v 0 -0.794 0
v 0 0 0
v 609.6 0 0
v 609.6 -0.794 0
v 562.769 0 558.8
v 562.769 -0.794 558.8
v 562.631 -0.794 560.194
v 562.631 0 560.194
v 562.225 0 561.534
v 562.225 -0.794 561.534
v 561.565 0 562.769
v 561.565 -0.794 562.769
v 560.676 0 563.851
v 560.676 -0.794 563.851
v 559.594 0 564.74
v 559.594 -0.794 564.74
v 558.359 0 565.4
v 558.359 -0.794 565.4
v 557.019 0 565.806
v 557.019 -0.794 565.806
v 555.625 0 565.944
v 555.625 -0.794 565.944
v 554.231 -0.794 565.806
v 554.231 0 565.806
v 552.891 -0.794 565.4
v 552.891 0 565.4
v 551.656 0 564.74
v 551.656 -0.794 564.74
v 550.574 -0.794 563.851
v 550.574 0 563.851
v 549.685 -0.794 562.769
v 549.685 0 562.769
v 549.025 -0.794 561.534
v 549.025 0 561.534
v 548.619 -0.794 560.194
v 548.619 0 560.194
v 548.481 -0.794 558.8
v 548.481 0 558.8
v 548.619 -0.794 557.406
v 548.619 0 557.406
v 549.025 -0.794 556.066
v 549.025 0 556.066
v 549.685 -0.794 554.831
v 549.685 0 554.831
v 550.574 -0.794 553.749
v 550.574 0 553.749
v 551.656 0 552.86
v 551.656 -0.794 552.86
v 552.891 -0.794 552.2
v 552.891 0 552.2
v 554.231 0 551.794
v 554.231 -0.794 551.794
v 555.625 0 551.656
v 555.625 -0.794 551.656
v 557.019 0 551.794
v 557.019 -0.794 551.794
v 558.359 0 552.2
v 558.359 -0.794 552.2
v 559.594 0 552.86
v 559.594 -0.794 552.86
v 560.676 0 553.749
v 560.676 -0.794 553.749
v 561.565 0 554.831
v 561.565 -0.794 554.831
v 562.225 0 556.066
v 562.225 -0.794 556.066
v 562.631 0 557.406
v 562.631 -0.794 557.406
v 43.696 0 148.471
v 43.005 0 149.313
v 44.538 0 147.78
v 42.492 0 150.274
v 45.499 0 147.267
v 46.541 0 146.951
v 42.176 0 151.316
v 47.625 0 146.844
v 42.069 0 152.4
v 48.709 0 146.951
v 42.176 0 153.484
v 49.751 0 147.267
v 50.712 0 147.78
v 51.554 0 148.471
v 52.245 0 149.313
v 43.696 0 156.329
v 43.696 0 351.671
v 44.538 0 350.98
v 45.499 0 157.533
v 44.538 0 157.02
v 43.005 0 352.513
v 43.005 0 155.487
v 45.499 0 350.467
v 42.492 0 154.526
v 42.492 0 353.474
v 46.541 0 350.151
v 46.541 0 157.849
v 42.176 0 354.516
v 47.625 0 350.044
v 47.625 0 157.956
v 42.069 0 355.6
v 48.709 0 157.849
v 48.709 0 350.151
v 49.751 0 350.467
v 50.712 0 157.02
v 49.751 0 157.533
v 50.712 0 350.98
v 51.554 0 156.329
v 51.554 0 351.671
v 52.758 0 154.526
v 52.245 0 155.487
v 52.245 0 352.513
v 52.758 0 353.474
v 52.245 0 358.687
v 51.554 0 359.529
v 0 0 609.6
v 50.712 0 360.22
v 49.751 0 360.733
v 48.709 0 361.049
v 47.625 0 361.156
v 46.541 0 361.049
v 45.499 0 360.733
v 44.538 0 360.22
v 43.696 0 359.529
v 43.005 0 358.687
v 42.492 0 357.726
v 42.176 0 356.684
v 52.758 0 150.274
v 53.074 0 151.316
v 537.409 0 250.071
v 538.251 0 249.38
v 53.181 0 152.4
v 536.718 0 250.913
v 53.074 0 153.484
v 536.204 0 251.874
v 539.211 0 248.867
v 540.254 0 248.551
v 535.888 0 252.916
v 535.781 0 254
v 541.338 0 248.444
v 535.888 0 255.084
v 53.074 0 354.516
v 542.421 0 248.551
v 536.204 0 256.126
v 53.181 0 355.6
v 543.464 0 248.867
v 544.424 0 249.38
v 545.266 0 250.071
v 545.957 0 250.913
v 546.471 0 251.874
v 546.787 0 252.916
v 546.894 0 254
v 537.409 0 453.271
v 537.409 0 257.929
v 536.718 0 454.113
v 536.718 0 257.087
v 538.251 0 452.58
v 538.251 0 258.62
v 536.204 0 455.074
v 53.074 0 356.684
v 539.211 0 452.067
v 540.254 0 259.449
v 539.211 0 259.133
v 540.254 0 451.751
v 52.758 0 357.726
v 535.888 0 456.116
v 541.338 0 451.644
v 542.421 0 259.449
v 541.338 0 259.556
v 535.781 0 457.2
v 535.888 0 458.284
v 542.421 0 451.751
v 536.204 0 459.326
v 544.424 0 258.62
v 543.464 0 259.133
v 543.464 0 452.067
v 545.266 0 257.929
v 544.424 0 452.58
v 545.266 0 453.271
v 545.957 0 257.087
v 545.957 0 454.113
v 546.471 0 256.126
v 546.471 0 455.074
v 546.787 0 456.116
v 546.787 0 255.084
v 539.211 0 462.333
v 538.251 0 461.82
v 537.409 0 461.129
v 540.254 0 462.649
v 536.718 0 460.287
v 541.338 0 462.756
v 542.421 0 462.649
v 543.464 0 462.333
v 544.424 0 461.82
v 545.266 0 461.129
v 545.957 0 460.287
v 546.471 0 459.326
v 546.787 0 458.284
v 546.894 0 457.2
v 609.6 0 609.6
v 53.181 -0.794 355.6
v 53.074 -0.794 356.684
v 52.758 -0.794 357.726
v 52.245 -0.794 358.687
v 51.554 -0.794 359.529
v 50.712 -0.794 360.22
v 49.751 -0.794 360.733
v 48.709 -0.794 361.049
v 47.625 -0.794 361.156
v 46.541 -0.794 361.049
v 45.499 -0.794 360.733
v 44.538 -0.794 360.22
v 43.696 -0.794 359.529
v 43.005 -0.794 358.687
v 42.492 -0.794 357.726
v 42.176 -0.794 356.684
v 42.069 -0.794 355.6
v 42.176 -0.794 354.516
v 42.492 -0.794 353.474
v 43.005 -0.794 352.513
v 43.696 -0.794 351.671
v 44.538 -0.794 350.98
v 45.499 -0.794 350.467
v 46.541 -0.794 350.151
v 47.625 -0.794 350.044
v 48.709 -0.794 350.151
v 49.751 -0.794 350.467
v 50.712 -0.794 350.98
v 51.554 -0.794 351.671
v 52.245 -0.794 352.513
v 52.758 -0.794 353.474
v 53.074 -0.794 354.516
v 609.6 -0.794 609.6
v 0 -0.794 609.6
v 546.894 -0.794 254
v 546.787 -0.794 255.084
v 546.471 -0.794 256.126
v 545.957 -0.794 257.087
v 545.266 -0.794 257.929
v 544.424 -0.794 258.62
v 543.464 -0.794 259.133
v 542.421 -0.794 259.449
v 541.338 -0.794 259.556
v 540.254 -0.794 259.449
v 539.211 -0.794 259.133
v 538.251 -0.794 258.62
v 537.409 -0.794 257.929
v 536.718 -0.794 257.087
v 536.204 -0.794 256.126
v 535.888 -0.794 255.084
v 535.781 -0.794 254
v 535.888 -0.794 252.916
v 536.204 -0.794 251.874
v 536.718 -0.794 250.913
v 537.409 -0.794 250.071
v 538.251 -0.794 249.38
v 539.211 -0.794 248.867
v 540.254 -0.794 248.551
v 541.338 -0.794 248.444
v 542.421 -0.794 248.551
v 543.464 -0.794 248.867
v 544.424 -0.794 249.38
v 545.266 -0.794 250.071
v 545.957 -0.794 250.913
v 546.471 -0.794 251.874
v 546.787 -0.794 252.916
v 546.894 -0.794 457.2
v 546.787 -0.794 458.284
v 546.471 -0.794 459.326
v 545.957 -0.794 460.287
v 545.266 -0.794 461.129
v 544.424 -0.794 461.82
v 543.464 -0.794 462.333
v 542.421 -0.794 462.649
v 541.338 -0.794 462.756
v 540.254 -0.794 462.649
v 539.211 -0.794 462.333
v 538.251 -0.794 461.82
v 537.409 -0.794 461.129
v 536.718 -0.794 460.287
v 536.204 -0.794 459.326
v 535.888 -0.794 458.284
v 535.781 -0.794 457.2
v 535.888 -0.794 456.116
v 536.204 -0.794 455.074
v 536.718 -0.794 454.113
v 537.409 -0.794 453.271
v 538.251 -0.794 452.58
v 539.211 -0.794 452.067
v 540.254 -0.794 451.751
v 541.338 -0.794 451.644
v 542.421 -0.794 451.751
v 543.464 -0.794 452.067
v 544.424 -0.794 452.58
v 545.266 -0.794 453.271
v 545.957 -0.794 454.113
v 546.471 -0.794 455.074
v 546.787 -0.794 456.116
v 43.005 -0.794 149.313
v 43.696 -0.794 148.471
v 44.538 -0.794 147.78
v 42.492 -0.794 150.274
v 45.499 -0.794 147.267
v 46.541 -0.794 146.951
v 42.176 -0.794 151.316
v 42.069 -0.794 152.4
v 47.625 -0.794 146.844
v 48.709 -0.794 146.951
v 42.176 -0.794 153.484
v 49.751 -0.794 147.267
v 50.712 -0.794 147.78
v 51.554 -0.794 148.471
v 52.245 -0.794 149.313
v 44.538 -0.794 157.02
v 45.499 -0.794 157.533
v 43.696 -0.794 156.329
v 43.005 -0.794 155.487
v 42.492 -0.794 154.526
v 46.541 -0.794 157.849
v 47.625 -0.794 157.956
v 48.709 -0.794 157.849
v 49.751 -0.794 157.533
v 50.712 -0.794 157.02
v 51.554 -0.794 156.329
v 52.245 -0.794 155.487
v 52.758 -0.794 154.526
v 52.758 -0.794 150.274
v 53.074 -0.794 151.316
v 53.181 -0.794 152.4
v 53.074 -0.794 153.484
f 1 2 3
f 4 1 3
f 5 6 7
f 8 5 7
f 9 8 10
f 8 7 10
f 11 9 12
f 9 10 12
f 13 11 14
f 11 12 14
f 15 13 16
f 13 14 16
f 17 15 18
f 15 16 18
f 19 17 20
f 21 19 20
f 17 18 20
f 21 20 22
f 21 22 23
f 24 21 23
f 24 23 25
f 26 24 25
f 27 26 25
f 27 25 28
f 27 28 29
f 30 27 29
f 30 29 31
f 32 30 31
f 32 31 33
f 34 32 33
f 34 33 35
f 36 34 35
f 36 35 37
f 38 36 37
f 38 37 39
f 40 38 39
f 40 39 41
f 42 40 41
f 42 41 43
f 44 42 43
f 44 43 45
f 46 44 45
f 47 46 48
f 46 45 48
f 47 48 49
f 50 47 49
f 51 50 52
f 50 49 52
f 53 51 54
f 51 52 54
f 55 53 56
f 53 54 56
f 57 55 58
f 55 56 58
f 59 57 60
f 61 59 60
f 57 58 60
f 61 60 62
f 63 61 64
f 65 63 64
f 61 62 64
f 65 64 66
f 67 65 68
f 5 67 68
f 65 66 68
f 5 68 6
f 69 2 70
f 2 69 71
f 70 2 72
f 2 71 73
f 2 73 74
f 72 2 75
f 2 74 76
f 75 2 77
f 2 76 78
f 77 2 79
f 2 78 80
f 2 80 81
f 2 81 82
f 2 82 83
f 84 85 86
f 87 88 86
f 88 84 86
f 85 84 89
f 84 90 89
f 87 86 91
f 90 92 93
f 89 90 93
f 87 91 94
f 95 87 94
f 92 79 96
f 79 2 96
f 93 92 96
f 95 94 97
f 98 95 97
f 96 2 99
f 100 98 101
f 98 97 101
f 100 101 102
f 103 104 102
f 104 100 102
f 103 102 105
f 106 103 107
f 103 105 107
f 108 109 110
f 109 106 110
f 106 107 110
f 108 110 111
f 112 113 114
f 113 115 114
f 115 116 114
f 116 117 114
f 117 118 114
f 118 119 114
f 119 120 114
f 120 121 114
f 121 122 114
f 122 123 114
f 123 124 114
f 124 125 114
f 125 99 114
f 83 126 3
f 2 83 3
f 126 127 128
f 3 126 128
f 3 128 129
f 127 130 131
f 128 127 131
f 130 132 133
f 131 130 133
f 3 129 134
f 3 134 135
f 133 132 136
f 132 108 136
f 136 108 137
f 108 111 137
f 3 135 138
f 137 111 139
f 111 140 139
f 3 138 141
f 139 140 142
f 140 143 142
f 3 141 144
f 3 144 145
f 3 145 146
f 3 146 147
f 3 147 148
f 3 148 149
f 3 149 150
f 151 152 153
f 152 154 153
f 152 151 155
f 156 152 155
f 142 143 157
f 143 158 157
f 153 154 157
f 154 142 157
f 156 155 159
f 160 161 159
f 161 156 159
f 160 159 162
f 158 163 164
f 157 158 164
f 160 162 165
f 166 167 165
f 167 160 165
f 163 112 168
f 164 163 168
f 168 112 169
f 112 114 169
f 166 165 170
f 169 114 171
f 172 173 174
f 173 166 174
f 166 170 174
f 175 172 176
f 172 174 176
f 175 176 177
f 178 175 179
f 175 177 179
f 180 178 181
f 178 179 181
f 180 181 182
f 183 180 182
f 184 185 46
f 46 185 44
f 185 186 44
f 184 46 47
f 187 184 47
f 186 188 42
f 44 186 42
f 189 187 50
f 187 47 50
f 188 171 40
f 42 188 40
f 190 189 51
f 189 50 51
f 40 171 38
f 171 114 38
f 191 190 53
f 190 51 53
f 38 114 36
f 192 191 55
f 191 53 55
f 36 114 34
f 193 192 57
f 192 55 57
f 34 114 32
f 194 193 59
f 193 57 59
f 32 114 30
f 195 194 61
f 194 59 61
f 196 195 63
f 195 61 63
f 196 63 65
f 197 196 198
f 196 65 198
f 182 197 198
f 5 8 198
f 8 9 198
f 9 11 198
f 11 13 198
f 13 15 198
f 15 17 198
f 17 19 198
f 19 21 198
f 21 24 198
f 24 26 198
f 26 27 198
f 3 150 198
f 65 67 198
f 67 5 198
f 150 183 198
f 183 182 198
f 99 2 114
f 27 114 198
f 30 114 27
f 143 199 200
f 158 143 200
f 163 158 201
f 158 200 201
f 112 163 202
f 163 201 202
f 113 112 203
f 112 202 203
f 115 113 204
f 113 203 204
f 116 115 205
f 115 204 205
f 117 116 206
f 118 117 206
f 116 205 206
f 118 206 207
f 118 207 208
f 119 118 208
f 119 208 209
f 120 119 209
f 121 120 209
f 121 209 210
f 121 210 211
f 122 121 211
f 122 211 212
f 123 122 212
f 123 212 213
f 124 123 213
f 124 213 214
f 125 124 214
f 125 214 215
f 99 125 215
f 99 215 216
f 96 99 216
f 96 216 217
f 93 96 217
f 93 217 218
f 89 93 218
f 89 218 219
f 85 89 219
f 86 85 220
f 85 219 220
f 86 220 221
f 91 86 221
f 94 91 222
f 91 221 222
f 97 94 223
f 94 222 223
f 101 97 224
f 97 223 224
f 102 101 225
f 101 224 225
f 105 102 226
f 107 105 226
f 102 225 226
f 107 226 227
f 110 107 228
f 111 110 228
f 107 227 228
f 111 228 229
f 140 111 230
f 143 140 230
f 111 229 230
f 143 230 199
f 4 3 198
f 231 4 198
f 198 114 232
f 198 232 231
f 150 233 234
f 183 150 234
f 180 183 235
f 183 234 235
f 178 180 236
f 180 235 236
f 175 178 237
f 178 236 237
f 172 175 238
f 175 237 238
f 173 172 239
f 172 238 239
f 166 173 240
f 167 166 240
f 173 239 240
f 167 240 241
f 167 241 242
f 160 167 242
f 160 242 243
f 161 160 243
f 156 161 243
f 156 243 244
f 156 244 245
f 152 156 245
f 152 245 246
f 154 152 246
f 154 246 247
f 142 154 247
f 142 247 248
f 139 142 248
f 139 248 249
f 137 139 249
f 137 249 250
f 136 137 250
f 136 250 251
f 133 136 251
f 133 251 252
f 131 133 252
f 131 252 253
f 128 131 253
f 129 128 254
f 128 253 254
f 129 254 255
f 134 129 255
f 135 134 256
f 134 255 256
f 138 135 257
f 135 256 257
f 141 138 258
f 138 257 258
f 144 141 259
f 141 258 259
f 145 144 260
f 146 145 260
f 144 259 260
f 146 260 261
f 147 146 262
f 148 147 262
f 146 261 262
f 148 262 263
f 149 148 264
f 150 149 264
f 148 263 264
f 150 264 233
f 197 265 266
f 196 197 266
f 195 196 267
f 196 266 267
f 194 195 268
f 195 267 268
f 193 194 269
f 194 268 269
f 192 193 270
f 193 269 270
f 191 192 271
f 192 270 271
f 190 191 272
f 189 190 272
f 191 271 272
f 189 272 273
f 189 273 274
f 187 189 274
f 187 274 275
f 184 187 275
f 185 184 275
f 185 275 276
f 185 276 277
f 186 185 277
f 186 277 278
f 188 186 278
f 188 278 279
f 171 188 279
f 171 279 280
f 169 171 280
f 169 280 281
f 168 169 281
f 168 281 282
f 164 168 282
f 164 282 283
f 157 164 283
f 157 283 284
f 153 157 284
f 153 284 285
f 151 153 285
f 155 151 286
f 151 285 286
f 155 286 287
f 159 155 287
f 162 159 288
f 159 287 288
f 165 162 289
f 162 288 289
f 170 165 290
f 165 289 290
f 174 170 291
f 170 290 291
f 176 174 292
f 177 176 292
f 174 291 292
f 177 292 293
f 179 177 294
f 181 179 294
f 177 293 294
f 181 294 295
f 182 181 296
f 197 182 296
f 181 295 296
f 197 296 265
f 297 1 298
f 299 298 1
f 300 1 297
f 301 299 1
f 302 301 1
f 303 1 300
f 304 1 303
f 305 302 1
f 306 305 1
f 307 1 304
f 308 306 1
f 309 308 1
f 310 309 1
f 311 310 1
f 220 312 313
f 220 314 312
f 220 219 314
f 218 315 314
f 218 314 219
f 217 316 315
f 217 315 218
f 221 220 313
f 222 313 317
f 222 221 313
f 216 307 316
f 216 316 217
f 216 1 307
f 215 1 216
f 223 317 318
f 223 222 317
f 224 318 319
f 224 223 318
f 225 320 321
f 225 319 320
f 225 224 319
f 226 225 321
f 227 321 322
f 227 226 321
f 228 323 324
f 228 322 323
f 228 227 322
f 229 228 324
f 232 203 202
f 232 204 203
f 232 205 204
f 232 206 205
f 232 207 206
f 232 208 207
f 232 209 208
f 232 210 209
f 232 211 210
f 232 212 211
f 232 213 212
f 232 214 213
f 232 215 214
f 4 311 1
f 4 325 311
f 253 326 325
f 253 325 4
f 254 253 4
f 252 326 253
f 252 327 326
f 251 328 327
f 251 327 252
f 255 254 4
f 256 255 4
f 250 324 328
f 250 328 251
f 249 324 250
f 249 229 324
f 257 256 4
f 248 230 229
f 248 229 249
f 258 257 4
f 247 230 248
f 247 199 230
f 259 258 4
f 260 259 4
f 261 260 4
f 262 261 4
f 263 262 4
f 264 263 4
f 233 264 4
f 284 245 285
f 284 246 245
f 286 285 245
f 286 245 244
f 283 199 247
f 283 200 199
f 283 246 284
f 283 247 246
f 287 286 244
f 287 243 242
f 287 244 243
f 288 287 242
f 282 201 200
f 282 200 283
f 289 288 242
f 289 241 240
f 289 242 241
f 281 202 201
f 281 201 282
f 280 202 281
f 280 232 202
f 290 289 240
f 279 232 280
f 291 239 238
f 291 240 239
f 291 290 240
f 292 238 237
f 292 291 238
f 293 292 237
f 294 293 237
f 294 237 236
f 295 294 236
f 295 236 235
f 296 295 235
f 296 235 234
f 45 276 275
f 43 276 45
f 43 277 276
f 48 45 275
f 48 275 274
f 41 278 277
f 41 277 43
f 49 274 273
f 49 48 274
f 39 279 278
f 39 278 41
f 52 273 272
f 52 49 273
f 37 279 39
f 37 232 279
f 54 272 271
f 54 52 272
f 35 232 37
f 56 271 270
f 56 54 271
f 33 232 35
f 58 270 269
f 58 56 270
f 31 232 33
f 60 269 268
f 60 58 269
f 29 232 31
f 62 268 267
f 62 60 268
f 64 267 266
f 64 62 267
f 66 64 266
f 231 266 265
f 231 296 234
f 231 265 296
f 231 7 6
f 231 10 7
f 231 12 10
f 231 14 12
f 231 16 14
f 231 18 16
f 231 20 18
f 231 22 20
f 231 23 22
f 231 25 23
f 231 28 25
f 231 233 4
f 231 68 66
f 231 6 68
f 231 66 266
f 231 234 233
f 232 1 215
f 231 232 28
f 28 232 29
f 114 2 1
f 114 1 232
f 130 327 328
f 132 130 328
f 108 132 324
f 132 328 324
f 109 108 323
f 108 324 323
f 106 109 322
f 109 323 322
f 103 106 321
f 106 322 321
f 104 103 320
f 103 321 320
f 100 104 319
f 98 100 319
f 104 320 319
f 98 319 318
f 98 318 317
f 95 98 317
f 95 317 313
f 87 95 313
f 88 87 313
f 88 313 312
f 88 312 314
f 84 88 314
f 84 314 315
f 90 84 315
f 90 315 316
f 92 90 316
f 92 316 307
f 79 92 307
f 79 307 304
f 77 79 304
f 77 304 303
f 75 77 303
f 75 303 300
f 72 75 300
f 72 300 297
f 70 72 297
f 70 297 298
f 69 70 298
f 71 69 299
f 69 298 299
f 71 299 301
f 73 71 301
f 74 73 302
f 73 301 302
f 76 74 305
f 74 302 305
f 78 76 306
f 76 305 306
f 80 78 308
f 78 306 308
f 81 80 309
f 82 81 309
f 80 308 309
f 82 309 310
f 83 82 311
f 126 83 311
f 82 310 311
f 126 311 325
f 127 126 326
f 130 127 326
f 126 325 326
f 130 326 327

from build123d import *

# Parameters (mm, degrees)
F0_W     = 609.6
F0_H     = 609.6
F1_DEPTH = 0.79375
F2_R     = 5.55625
F3_DEPTH = 25.4
F4_R     = 7.14375
F5_DEPTH = 25.4


with BuildPart() as f1:
    # F0 (on Front) → F1 (new body)
    with BuildSketch(Plane.XZ):
        with Locations((304.8, 304.8)):
            Rectangle(F0_W, F0_H)
    extrude(amount=F1_DEPTH)

    # F2 (on face) → F3 (cut)
    with BuildSketch(Plane.XZ.offset(0.79375)):
        with Locations((47.625, 355.6)):
            Circle(F2_R)
        with Locations((47.625, 152.4)):
            Circle(F2_R)
        with Locations((541.3375, 254)):
            Circle(F2_R)
        with Locations((541.3375, 457.2)):
            Circle(F2_R)
    extrude(amount=-F3_DEPTH, mode=Mode.SUBTRACT)

    # F4 (on face) → F5 (cut)
    with BuildSketch(Plane.XZ.offset(0.79375)):
        with Locations((555.625, 558.8)):
            Circle(F4_R)
    extrude(amount=-F5_DEPTH, mode=Mode.SUBTRACT)


solid = f1.part
